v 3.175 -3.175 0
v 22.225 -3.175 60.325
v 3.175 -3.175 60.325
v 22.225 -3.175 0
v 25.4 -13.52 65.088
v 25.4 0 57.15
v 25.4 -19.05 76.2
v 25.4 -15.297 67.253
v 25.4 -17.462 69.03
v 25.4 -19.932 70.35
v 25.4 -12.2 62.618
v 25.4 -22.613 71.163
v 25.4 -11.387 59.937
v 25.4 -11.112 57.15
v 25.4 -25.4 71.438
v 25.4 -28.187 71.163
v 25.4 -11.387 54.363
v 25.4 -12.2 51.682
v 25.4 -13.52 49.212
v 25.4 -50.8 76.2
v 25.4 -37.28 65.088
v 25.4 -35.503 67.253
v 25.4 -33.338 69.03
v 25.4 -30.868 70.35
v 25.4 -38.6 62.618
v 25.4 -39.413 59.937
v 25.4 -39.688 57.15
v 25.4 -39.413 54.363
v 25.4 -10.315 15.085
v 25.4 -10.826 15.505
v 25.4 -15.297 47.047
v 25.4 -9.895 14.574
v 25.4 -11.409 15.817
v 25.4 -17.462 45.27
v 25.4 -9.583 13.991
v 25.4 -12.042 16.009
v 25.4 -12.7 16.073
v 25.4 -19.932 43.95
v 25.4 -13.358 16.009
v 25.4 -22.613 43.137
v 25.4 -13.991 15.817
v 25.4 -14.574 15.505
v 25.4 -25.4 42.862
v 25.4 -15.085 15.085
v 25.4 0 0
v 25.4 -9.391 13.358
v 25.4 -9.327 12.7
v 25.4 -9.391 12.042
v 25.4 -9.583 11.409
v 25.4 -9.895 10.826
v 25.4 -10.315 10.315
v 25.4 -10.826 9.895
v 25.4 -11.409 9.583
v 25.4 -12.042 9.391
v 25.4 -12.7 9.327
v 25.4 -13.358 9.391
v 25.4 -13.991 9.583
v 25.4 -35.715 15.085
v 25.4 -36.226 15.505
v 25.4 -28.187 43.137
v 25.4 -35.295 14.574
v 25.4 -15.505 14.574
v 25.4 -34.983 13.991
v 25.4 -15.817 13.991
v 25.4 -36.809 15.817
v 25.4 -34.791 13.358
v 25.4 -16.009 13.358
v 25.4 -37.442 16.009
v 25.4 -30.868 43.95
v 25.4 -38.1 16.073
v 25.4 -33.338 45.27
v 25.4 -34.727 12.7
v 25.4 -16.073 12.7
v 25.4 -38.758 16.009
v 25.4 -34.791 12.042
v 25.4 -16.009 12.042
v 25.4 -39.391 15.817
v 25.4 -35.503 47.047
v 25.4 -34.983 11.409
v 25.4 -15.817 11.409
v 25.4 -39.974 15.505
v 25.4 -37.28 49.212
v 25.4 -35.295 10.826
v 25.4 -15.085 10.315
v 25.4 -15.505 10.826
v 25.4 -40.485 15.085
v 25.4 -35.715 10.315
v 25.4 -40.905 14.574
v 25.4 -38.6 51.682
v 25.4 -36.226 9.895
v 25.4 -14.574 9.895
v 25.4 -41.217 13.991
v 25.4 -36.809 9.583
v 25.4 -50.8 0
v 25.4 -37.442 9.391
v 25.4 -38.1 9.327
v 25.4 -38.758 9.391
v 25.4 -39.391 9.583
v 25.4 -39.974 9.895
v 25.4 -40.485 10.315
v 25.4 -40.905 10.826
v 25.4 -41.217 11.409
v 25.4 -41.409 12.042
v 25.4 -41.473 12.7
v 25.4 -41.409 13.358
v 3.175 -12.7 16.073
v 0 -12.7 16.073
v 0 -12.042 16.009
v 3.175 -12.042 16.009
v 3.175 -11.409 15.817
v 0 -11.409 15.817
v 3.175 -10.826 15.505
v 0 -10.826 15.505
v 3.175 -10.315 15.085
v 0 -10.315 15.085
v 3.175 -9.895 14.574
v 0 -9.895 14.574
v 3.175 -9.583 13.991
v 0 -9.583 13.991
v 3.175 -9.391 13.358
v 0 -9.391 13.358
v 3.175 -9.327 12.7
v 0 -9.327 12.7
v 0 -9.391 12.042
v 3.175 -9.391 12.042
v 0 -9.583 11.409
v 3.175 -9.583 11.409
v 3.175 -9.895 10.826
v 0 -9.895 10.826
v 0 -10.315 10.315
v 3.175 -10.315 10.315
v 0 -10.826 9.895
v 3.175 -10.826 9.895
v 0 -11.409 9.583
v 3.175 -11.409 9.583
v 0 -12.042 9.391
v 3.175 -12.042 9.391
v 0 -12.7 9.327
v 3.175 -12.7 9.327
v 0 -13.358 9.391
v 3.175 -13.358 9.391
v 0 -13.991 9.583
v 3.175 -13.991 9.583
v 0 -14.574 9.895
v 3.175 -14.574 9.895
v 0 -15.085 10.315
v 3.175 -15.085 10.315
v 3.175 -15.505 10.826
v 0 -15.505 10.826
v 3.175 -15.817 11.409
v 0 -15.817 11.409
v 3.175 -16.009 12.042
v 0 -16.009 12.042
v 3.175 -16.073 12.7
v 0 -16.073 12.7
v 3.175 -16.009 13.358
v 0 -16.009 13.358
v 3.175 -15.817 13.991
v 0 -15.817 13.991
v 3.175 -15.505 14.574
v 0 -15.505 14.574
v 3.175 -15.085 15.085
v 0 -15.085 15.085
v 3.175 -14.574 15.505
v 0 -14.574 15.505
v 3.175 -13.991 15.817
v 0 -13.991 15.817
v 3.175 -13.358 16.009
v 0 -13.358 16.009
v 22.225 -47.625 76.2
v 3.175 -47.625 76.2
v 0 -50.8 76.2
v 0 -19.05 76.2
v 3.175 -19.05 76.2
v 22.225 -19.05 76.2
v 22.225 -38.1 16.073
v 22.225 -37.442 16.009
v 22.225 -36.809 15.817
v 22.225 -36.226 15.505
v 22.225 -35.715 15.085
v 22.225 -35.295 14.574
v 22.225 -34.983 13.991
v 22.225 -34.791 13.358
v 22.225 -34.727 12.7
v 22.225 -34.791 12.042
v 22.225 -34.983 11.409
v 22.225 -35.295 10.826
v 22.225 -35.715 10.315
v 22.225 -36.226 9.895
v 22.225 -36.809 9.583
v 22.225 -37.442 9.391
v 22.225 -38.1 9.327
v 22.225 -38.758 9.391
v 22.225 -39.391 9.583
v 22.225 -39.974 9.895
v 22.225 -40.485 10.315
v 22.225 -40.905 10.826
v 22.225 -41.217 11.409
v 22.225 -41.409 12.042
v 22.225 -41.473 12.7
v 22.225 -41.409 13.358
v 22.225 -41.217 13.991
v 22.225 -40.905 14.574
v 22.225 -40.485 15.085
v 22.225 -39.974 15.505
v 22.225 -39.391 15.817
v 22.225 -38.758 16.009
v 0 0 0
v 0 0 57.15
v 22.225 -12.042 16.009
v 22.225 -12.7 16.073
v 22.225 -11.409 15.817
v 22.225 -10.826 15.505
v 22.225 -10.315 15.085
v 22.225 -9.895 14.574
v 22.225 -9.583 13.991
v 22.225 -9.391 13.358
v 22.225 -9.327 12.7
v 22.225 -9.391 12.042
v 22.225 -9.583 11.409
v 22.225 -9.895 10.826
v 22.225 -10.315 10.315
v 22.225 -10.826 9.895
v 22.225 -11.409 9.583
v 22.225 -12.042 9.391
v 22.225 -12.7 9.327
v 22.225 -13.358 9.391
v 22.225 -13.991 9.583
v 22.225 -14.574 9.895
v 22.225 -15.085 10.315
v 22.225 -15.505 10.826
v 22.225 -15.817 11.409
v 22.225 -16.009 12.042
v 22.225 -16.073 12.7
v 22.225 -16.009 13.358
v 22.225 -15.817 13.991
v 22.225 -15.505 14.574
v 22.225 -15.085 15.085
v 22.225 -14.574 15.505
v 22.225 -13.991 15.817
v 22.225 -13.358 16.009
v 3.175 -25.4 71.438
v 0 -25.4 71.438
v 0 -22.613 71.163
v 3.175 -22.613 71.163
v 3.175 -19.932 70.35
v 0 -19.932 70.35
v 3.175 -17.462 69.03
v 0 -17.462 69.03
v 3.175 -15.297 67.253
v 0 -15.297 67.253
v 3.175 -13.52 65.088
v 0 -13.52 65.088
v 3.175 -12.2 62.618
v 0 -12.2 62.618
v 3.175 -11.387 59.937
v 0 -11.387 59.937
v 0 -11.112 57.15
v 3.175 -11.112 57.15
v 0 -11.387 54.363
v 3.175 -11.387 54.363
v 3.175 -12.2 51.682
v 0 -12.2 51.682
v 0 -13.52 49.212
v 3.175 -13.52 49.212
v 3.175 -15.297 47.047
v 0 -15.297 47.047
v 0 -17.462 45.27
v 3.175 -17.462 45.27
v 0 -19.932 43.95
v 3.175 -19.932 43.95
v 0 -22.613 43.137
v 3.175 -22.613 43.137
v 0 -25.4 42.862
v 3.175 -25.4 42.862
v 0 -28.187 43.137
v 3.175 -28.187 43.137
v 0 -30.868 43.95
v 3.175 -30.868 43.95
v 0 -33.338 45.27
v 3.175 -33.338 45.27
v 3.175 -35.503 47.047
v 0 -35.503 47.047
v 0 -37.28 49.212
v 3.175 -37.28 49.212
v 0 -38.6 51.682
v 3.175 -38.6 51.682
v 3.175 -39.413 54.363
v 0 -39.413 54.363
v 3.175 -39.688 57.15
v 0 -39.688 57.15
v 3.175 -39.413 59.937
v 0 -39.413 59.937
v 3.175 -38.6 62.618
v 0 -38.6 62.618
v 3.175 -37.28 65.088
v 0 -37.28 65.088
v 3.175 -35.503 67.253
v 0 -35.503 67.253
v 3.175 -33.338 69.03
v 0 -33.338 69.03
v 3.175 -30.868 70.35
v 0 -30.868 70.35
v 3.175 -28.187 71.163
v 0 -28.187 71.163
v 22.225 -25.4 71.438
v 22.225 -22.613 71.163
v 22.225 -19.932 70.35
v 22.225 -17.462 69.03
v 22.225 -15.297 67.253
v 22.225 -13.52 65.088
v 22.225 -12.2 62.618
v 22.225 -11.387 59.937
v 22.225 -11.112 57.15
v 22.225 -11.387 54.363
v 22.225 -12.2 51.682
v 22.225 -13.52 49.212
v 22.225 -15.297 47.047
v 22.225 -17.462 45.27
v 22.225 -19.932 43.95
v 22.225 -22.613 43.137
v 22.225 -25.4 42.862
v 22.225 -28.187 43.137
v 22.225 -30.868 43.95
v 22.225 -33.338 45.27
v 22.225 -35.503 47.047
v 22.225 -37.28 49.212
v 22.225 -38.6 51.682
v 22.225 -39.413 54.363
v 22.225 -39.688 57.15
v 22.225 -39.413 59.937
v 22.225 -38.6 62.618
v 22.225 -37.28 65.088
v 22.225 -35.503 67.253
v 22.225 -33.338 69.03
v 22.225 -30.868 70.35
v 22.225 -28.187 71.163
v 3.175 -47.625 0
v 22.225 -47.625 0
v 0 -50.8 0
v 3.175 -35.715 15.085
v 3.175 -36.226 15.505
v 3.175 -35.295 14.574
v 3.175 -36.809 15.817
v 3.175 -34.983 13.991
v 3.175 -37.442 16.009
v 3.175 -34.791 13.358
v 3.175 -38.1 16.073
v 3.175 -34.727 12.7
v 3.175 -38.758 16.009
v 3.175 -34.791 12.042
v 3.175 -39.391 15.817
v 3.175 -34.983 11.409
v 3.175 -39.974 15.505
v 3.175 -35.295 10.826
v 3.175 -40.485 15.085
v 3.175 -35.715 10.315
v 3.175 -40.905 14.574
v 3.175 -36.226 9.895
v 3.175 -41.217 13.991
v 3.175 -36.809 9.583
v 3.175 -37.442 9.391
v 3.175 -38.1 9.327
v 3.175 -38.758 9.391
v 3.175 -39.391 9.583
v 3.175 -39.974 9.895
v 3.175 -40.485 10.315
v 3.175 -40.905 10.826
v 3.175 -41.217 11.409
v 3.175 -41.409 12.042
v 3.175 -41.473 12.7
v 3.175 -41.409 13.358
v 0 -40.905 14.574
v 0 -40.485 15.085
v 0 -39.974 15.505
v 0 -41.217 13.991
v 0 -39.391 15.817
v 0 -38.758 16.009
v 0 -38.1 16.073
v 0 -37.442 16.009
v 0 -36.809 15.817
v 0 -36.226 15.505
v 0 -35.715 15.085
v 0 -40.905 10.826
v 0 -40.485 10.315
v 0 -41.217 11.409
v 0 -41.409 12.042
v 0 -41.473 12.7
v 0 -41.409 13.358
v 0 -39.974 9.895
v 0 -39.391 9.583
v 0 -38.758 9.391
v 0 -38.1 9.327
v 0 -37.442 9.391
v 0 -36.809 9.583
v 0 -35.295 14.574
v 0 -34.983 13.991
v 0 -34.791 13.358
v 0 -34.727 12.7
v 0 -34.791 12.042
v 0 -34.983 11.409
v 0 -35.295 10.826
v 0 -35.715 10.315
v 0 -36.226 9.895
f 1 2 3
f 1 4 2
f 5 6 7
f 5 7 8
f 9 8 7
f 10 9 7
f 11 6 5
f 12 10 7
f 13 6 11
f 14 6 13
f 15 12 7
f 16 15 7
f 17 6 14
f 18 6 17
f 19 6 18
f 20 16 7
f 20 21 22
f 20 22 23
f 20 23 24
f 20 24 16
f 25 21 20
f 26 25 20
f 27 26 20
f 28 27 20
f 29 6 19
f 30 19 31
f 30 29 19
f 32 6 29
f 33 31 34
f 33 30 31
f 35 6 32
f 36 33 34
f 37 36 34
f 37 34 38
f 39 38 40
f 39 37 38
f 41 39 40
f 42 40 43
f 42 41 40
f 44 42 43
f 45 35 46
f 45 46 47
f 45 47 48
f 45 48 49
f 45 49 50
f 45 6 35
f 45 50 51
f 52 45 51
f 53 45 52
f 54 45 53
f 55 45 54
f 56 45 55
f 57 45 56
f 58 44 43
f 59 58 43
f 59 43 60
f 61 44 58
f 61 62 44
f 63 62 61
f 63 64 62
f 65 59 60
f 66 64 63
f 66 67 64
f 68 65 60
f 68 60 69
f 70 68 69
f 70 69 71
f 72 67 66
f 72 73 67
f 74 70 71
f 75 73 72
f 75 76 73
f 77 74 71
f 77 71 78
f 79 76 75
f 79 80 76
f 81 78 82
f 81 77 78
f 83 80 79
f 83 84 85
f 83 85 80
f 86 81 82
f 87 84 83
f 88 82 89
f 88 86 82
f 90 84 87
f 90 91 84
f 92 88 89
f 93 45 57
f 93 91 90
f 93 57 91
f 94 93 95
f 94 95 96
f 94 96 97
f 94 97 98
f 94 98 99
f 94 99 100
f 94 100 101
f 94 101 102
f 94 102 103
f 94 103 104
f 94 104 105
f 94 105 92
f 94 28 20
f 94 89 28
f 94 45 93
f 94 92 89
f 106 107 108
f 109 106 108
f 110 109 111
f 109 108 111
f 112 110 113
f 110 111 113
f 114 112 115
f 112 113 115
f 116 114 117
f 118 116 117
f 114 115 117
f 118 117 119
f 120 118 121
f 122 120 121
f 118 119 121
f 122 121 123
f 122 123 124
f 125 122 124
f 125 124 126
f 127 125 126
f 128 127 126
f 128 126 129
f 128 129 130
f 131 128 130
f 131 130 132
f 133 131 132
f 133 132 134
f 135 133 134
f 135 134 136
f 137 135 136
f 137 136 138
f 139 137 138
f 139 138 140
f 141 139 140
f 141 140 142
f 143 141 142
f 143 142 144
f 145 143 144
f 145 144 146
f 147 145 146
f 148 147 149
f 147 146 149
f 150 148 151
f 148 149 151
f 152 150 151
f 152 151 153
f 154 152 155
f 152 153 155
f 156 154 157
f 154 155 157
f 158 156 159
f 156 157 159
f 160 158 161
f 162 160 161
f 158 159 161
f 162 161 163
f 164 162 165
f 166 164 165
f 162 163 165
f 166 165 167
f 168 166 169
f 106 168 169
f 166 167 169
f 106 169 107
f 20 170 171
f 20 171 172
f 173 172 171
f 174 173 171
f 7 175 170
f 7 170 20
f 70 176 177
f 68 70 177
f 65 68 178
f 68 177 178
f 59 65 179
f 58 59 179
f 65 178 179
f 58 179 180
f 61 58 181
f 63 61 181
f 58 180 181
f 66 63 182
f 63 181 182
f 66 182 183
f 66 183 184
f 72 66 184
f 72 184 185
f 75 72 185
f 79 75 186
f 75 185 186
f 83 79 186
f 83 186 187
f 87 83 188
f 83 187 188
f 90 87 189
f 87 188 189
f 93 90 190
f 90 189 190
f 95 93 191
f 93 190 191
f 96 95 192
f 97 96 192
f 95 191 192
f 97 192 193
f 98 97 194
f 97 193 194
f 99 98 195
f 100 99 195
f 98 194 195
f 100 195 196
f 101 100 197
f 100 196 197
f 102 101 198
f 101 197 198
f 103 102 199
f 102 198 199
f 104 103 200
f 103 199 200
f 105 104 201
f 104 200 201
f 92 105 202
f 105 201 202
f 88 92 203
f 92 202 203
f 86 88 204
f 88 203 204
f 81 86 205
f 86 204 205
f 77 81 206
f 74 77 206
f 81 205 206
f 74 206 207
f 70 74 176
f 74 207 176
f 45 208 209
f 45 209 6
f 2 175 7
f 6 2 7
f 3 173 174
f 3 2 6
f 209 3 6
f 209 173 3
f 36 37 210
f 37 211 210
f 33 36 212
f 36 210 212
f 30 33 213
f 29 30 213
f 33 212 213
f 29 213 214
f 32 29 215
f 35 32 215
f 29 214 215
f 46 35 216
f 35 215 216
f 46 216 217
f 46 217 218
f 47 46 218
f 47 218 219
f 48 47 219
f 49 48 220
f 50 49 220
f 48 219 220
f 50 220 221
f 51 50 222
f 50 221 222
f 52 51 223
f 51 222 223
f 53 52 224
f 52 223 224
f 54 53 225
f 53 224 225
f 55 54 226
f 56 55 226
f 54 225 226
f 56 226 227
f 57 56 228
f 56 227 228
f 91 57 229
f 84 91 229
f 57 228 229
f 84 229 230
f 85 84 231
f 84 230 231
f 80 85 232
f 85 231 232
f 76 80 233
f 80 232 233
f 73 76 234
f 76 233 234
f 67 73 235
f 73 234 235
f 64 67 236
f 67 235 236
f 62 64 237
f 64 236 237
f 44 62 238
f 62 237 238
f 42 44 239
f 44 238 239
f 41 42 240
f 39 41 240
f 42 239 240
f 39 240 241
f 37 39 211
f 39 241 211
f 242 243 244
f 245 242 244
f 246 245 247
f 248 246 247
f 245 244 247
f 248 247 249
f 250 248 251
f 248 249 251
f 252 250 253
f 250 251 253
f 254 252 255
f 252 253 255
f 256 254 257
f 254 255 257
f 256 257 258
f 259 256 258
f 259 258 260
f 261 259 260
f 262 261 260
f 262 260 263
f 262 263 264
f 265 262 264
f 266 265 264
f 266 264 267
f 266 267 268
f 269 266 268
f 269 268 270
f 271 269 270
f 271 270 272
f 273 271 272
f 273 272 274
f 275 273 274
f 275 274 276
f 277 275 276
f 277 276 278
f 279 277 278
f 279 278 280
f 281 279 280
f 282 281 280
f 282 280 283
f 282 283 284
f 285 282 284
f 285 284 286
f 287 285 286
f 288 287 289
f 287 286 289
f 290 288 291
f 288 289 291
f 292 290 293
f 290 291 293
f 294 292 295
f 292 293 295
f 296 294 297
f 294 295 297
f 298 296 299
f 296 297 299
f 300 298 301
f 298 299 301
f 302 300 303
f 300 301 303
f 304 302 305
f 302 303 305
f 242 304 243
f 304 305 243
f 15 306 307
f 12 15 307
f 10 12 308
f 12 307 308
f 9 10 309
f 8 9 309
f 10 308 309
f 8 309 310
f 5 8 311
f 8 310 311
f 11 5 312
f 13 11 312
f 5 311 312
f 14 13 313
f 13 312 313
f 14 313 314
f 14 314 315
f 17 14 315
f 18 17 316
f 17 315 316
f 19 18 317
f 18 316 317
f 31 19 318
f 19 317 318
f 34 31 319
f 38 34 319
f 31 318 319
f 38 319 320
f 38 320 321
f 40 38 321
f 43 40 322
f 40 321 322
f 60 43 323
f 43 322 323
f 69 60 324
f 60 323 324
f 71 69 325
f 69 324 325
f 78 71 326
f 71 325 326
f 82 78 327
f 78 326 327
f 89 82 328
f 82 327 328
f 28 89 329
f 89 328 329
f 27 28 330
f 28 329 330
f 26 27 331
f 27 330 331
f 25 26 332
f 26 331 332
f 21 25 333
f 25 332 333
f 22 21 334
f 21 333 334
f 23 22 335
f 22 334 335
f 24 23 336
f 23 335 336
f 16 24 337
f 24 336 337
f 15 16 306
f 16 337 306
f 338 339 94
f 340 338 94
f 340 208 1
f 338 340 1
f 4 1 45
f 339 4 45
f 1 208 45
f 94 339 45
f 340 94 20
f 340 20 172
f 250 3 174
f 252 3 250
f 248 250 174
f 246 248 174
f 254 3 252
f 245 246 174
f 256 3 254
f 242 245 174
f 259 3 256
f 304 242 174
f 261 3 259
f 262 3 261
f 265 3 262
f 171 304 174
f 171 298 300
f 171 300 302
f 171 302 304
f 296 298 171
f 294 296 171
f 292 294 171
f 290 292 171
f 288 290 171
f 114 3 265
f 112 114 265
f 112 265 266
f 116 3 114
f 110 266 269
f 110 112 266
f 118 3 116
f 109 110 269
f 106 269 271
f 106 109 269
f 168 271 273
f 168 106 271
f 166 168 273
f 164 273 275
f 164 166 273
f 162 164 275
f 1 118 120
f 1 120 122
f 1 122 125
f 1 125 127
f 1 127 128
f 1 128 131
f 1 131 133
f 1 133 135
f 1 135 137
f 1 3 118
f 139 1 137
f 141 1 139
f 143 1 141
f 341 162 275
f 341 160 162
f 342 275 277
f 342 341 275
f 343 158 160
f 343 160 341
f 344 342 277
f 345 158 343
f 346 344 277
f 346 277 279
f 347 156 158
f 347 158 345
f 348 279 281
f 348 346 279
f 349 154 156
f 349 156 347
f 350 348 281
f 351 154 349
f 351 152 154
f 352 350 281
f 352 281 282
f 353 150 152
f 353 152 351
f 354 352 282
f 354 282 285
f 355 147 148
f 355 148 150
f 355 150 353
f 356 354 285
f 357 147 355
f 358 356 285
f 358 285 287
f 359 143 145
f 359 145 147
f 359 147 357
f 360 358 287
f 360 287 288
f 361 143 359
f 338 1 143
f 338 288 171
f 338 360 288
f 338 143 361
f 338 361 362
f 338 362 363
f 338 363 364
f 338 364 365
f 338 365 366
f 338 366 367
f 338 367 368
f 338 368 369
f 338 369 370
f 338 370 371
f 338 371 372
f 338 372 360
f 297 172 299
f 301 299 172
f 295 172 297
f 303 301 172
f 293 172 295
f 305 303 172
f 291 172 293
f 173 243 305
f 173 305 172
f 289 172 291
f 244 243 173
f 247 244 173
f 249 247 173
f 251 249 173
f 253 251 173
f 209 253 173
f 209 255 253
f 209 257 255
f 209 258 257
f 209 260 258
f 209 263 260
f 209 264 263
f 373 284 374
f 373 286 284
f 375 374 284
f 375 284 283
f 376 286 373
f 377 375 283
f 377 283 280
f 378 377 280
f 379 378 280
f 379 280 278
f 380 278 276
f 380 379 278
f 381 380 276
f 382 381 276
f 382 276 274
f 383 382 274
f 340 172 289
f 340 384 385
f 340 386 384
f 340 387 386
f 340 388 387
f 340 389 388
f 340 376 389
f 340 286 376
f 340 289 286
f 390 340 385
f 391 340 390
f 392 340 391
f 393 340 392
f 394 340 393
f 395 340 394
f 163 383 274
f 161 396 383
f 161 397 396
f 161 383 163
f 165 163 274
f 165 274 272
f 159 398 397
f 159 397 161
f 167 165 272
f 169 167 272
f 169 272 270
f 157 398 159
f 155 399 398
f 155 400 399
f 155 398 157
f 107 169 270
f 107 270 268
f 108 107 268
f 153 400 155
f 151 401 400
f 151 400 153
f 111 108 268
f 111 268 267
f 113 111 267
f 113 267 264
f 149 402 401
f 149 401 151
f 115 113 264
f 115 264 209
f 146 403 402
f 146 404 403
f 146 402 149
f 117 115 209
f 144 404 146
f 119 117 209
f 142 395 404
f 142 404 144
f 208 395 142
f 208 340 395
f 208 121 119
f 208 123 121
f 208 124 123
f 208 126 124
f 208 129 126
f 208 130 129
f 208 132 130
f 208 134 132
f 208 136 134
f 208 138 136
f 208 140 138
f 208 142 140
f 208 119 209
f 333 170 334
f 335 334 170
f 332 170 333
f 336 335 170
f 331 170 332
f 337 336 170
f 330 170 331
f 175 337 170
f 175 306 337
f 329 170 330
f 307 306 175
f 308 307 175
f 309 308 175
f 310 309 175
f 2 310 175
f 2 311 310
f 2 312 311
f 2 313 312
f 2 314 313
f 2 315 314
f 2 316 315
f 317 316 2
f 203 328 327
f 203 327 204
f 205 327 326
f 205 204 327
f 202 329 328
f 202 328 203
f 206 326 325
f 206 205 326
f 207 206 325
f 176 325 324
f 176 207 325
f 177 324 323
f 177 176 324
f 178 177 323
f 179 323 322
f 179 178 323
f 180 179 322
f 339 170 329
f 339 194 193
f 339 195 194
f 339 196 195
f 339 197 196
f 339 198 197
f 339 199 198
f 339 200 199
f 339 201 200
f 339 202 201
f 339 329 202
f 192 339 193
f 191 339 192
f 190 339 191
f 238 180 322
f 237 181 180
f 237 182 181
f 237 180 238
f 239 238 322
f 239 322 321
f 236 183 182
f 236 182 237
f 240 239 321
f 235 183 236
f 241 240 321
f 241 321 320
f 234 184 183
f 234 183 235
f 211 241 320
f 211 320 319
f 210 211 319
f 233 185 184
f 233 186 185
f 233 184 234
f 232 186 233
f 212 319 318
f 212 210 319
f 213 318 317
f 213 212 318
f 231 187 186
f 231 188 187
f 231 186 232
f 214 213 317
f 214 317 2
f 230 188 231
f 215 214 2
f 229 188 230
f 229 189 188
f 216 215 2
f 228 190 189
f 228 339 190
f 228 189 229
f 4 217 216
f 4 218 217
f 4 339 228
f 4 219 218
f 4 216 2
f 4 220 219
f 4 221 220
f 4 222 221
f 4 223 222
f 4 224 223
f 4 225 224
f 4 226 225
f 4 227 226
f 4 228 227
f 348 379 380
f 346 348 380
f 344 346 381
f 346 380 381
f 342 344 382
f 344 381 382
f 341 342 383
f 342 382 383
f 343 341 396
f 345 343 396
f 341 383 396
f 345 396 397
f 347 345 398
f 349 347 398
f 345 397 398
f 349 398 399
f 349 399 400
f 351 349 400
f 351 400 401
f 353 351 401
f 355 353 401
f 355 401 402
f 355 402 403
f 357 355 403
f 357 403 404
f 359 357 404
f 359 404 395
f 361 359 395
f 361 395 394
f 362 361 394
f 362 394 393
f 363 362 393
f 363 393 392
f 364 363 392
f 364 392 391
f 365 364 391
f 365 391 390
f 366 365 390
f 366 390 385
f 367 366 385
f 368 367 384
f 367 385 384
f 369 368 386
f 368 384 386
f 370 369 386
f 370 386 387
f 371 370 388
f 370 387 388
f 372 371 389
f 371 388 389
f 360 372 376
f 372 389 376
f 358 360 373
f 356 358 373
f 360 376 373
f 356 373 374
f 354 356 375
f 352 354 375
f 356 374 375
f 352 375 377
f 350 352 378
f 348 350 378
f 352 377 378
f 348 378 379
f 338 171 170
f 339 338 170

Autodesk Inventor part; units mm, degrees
ref_plane "YZ Plane" through (0, 0, 0) normal (1, 0, 0) x (0, 1, 0)
ref_plane "XZ Plane" through (0, 0, 0) normal (0, 1, 0) x (-1, 0, 0)
ref_plane "XY Plane" through (0, 0, 0) normal (0, 0, 1) x (1, 0, 0)
sketch "Sketch1" plane through (0, 0, 0) normal (0, 0, 1) x (1, 0, 0)
  line L0 (0, 0) -> (25.4, 0)
  line L1 (25.4, 0) -> (25.4, -50.8)
  line L2 (25.4, -50.8) -> (0, -50.8)
  line L3 (0, -50.8) -> (0, 0)
  line L4 (22.225, -3.175) -> (3.175, -3.175)
  line L5 (3.175, -3.175) -> (3.175, -47.625)
  line L6 (3.175, -47.625) -> (22.225, -47.625)
  line L7 (22.225, -47.625) -> (22.225, -3.175)
  dimension "d0" = 25.4
  dimension "d1" = 50.8
  dimension "d2" = 3.175
  dimension "d3" = 3.175
  dimension "d4" = 3.175
  dimension "d5" = 3.175
extrude "Extrusion1" add sketch "Sketch1" along normal blind 76.2
sketch "Sketch2" plane through (0, -50.8, 0) normal (-1, 0, 0) x (0, 0, 1)
  circle A0 centre (57.15, 25.4) radius 14.2875
  line L0 (76.2, 50.8) -> (76.2, 0) projected
  line L1 (0, 50.8) -> (76.2, 50.8) projected
  dimension "d8" = 28.575
  dimension "d9" = 19.05
  dimension "d10" = 25.4
extrude "Extrusion2" cut sketch "Sketch2" against normal through all
sketch "Sketch3" plane through (0, -50.8, 0) normal (-1, 0, 0) x (0, 0, 1)
  line L0 (76.2, 47.625) -> (76.2, 3.175) projected
  line L1 (76.2, 31.75) -> (57.15, 50.8)
  line L2 (0, 50.8) -> (76.2, 50.8) projected
  line L3 (76.2, 0) -> (76.2, 50.8) projected
  line L4 (57.15, 50.8) -> (76.2, 50.8)
  line L5 (76.2, 50.8) -> (76.2, 31.75)
  dimension "d13" = 135
  dimension "d14" = 19.05
extrude "Extrusion3" cut sketch "Sketch3" against normal through all
sketch "Sketch4" plane through (0, -50.8, 0) normal (-1, 0, 0) x (0, 0, 1)
  circle A0 centre (12.7, 12.7) radius 3.3734
  circle A1 centre (12.7, 38.1) radius 3.3734
  line L0 (0, 50.8) -> (57.15, 50.8) projected
  line L1 (0, 0) -> (0, 50.8) projected
  dimension "d17" = 6.7469
  dimension "d18" = 12.7
  dimension "d19" = 38.1
  dimension "d20" = 12.7
  dimension "d21" = 12.7
extrude "Extrusion4" cut sketch "Sketch4" against normal blind 25.4
properties part number "flywheelsupport2" material "Aluminum 6061"
